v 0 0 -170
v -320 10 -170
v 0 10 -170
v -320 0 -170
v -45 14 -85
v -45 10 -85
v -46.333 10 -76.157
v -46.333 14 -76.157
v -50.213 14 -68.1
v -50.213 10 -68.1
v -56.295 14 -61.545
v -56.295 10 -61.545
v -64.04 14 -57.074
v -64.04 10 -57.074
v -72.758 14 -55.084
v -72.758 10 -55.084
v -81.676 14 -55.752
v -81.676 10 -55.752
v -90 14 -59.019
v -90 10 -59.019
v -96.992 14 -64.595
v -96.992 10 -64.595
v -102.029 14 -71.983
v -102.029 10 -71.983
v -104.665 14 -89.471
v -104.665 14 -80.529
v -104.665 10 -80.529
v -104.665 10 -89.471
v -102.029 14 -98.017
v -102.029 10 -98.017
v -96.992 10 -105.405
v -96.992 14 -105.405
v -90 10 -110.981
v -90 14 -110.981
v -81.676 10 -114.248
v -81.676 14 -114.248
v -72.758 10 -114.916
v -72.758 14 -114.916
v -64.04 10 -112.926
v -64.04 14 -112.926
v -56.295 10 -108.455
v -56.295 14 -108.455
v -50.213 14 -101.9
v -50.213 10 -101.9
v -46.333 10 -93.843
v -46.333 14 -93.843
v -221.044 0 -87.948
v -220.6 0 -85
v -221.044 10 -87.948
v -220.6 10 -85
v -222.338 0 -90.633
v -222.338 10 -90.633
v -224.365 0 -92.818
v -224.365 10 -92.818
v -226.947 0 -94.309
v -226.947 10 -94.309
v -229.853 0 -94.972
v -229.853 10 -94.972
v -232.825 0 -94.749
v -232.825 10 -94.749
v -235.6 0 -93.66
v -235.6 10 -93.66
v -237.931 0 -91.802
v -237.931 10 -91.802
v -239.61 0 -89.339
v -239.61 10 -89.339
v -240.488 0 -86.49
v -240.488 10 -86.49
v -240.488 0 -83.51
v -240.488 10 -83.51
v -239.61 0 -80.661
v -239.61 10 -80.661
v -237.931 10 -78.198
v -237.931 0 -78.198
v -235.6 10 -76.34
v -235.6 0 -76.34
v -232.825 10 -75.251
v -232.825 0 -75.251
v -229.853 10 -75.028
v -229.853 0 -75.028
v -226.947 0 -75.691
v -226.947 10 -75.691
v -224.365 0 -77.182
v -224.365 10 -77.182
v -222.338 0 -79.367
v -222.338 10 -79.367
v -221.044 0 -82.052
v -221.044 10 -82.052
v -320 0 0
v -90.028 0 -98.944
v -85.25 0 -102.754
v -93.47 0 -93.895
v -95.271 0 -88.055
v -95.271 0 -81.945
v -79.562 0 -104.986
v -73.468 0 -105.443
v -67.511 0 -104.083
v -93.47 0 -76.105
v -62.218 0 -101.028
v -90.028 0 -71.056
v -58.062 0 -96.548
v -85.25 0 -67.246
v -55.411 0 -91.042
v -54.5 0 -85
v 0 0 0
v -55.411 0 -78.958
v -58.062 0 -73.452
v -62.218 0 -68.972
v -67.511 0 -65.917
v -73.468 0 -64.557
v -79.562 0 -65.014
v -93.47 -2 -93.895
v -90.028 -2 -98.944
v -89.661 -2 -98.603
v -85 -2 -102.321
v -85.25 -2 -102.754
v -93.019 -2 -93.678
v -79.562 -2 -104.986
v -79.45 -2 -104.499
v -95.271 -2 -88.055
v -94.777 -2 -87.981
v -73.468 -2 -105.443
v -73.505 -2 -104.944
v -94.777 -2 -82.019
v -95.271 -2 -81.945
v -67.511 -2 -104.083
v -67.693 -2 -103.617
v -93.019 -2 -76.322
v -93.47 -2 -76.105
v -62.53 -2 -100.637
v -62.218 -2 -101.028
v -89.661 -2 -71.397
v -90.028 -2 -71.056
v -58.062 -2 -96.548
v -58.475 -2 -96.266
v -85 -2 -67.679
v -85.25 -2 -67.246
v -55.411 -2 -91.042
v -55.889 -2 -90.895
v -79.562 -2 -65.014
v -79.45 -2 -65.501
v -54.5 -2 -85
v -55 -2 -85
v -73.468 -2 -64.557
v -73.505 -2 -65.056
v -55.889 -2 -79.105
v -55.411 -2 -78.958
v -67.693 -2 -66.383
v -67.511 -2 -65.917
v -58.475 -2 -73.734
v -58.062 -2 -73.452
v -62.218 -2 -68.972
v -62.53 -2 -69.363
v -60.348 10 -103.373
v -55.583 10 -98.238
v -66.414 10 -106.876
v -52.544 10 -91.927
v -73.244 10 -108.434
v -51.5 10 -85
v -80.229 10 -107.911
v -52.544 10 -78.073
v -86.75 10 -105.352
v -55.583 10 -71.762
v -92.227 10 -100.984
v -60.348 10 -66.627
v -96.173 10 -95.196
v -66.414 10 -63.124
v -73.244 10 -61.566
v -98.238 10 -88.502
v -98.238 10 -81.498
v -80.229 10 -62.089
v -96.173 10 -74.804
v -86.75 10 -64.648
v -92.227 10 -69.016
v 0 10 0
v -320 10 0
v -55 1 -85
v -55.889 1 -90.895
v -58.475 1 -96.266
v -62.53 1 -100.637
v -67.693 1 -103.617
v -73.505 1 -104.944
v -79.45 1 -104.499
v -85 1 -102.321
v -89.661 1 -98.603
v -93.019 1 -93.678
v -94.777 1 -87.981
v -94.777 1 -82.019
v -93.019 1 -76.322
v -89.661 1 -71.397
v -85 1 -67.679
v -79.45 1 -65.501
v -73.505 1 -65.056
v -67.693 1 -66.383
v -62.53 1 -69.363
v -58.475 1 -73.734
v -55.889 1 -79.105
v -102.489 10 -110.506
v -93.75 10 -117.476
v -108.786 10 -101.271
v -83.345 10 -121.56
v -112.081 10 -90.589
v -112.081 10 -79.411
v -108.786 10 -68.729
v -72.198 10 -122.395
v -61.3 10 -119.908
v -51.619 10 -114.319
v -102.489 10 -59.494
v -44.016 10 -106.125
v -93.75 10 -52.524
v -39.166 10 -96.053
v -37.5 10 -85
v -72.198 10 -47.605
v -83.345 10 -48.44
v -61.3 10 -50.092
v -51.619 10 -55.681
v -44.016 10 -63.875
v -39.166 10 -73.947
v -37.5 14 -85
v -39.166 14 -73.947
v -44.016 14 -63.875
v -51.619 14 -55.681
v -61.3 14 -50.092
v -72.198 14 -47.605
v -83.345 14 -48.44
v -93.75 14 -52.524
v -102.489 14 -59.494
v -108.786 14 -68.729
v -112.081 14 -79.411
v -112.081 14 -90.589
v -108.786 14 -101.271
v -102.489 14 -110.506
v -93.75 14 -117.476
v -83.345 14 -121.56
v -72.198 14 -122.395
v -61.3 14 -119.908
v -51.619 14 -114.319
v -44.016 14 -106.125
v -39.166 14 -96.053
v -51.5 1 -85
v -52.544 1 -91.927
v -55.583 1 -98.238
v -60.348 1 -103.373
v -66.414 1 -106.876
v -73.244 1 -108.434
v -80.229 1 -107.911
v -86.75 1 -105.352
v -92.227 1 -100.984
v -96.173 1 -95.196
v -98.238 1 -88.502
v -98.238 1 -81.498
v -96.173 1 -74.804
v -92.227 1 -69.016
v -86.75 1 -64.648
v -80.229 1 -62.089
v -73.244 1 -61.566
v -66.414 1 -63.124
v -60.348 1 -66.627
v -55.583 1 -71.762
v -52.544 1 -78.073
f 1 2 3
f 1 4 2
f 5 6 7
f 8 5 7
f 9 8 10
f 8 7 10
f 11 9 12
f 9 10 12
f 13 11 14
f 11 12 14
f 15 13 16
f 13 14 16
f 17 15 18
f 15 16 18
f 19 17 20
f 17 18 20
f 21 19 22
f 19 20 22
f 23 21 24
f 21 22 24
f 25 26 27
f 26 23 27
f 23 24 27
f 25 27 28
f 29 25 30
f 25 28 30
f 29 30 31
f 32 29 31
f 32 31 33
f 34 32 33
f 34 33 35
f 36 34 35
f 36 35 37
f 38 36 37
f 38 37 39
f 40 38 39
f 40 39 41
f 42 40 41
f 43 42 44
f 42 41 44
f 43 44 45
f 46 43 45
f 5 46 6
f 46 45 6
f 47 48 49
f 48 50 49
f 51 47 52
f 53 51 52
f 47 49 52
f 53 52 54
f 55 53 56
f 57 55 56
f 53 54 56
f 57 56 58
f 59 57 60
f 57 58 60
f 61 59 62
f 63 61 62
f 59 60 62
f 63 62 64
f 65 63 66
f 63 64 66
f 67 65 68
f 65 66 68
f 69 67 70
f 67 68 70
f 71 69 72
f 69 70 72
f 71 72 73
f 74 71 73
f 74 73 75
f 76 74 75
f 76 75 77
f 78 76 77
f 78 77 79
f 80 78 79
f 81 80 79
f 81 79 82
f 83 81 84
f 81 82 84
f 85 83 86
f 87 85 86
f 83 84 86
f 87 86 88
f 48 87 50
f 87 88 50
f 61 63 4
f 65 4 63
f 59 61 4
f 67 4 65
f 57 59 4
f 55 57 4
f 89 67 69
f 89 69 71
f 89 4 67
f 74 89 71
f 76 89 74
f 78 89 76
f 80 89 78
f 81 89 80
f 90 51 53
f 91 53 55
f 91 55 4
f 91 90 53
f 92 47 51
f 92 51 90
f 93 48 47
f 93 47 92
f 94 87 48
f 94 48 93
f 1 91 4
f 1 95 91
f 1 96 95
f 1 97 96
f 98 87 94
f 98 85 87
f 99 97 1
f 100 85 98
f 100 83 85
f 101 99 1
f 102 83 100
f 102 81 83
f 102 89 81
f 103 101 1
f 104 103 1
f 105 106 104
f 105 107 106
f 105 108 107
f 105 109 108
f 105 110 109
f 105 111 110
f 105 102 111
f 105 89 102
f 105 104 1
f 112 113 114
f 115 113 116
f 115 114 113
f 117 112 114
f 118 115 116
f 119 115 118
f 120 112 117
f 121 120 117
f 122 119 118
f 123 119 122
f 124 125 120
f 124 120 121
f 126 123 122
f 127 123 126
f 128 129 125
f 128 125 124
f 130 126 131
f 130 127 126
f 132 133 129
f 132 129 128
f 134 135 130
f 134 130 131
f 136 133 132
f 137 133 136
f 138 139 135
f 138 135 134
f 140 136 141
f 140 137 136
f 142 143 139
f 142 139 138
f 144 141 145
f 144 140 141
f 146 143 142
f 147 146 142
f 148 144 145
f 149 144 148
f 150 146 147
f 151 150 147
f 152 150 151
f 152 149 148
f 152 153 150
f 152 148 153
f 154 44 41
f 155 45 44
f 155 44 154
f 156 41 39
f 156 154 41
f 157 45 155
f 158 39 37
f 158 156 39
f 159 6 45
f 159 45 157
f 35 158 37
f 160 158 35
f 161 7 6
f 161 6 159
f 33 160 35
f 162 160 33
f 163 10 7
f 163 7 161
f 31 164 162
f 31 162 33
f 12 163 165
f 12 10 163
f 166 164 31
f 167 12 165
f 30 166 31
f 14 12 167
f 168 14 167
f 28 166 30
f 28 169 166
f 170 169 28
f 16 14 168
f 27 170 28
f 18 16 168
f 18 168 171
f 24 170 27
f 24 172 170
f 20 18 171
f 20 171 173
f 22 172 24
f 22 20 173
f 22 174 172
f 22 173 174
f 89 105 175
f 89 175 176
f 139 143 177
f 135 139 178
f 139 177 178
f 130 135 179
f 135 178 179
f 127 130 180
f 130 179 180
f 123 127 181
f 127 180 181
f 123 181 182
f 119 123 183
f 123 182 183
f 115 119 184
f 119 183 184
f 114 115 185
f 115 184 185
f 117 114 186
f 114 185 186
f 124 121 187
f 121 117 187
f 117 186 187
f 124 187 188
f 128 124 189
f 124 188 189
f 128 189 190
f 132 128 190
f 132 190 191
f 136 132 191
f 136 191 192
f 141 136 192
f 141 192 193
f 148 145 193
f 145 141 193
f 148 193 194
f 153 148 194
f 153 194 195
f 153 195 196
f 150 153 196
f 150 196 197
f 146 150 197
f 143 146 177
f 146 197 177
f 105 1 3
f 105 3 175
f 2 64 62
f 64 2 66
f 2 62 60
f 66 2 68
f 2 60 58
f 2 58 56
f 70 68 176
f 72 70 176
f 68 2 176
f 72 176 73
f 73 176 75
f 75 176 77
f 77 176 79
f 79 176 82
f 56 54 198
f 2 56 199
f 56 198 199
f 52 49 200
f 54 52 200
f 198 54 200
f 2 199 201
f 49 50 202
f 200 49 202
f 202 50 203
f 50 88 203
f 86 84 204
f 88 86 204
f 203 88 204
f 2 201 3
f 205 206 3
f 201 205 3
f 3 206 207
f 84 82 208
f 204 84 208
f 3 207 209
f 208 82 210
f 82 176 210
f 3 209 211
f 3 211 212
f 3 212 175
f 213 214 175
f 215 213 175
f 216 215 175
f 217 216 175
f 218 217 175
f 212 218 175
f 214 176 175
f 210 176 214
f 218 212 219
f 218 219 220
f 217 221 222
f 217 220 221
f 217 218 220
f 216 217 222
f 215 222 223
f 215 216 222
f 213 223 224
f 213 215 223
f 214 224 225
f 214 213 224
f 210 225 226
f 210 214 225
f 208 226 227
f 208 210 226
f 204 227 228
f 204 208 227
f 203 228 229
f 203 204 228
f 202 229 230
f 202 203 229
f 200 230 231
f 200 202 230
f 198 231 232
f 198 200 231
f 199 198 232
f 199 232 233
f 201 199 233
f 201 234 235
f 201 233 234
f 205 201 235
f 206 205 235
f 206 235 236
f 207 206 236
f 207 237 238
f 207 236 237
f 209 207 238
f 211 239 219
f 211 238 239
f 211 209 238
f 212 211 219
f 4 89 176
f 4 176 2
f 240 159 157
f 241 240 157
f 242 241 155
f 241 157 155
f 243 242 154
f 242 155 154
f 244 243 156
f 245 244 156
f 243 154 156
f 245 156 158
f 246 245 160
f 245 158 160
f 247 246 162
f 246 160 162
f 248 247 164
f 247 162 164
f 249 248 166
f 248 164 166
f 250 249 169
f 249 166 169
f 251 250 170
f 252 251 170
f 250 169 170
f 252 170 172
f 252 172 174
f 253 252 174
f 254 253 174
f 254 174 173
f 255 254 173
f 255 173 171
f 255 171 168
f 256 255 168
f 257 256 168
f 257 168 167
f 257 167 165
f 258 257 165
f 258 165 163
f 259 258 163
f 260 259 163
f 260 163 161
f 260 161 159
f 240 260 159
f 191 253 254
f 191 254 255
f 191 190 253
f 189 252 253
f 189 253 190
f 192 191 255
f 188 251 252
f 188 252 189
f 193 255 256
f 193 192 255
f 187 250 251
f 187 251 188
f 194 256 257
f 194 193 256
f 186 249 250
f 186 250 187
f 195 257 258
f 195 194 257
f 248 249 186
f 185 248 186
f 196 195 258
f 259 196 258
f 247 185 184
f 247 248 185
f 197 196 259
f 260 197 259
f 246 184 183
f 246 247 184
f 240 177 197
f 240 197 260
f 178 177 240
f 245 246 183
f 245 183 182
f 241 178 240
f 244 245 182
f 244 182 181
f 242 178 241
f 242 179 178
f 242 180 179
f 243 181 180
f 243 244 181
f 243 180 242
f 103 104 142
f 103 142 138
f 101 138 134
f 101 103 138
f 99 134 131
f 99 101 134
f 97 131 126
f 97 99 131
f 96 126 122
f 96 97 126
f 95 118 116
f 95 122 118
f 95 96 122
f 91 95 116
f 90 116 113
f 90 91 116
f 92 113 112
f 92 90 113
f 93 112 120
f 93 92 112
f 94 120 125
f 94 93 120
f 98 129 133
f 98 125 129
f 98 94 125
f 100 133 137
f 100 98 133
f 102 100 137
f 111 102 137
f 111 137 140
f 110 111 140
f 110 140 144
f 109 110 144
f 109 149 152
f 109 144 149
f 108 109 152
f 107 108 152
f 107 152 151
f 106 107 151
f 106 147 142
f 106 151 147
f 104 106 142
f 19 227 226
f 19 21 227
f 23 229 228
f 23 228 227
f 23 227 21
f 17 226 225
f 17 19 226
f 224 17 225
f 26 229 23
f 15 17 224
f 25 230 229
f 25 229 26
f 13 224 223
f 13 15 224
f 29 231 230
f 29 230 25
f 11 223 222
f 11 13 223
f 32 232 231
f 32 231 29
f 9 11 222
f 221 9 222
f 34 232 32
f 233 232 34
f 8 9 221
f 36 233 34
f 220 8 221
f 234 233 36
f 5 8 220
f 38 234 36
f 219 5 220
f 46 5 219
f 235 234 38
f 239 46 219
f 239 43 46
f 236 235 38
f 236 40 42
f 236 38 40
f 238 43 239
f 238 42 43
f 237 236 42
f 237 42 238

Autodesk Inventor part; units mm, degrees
ref_plane "YZ Plane" through (0, 0, 0) normal (1, 0, 0) x (0, 1, 0)
ref_plane "XZ Plane" through (0, 0, 0) normal (0, 1, 0) x (-1, 0, 0)
ref_plane "XY Plane" through (0, 0, 0) normal (0, 0, 1) x (1, 0, 0)
sketch "Sketch1" plane through (0, 0, 0) normal (0, 1, 0) x (-1, 0, 0)
  line L0 (0, 0) -> (250, 0)
  line L1 (250, 0) -> (250, -170)
  line L2 (250, -170) -> (0, -170)
  line L3 (0, -170) -> (0, 0)
  line L4 (0, 0) -> (150, 0)
  dimension "d0" = 250
  dimension "d1" = 170
  dimension "d2" = 150
extrude "Extrusion1" add sketch "Sketch1" along normal blind 10
sketch "Sketch2" plane through (0, 10, 0) normal (0, 1, 0) x (1, 0, 0)
  line L0 (0, 0) -> (-150, 0)
  line L1 (-250, 0) -> (0, 0) projected
  line L2 (0, 170) -> (-250, 170) projected
  circle A0 centre (-75, 85) radius 20
  dimension "d5" = 150
  dimension "d6" = 40
extrude "Extrusion2" cut sketch "Sketch2" against normal blind 10
sketch "Sketch3" plane through (0, 10, 0) normal (0, 1, 0) x (1, 0, 0)
  circle A0 centre (-75, 85) radius 20 projected
  circle A1 centre (-75, 85) radius 23.5
  point P0 (0, 0)
  dimension "d9" = 47
extrude "Extrusion3" cut sketch "Sketch3" against normal blind 9
sketch "Sketch4" plane through (0, 10, 0) normal (0, 1, 0) x (1, 0, 0)
  circle A0 centre (-75, 85) radius 20 projected
  circle A1 centre (-75, 85) radius 30
  circle A2 centre (-75, 85) radius 37.5
  point P0 (0, 0)
  dimension "d12" = 60
  dimension "d13" = 75
extrude "Extrusion4" add sketch "Sketch4" along normal blind 4 contours A2
sketch "Sketch5" plane through (0, 0, 0) normal (0, -1, 0) x (1, 0, 0)
  circle A0 centre (-75, -85) radius 20 projected
  circle A1 centre (-75, -85) radius 20.5
  circle A2 centre (-75, -85) radius 20
  point P0 (0, 0)
  dimension "d16" = 41
  dimension "d17" = 40
extrude "Extrusion5" add sketch "Sketch5" along normal blind 2
sketch "Sketch6" plane through (0, 10, 0) normal (0, 1, 0) x (1, 0, 0)
  circle A0 centre (-75, 85) radius 23.5 projected
  circle A1 centre (-75, 85) radius 50
  circle A2 centre (-230.6, 85) radius 10
  point P0 (0, 0)
  dimension "d20" = 100
  dimension "d22" = 20
extrude "Extrusion6" cut sketch "Sketch6" against normal blind 10 contours A2
sketch "Sketch7" plane through (0, 0, 0) normal (0, -1, 0) x (1, 0, 0)
  line L0 (-250, -170) -> (-250, 0) projected
  line L1 (-250, 0) -> (-320, 0)
  line L2 (-320, 0) -> (-320, -170)
  line L3 (-320, -170) -> (-250, -170)
  line L4 (-250, -170) -> (-250, 0)
  point P0 (0, 0)
  dimension "d25" = 70
  dimension "d26" = 170
extrude "Extrusion7" add sketch "Sketch7" against normal blind 10
properties part number "b_base cover_test 1"
